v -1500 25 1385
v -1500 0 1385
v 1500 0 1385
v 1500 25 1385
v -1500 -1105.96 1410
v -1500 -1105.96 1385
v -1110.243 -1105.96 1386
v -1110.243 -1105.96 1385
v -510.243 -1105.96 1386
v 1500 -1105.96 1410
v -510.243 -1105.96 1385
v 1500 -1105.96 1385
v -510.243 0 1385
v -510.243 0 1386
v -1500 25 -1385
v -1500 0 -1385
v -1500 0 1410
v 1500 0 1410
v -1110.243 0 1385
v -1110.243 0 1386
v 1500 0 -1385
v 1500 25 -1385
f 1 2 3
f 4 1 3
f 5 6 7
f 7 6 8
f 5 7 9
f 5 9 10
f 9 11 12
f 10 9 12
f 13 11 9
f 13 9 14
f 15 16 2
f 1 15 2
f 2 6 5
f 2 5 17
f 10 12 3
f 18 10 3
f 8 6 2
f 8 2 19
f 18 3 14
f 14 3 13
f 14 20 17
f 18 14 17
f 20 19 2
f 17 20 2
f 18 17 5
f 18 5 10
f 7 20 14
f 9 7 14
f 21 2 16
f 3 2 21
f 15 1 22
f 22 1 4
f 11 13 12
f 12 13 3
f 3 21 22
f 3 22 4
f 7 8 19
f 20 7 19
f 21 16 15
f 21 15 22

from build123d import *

# Parameters (mm, degrees)
F0_W     = 3000
F0_H     = 2770
F1_DEPTH = 25
F2_W     = 2010.242724
F2_H     = 1105.960011
F2_W_2   = 600
F2_W_3   = 389.757276
F3_DEPTH = 25
F4_DEPTH = 1


with BuildPart() as f1:
    # F0 (on Front) → F1 (new body)
    with BuildSketch(Plane.XZ):
        Rectangle(F0_W, F0_H)
    extrude(amount=-F1_DEPTH)


with BuildPart() as f3:
    # F2 (on face) → F3 (new body)
    with BuildSketch(Plane.XY.offset(1385)):
        with Locations((494.878638, -552.980005)):
            Rectangle(F2_W, F2_H)
        with Locations((-810.242724, -552.980005)):
            Rectangle(F2_W_2, F2_H)
        with Locations((-1305.121362, -552.980005)):
            Rectangle(F2_W_3, F2_H)
    extrude(amount=F3_DEPTH)

    # F2 (on face) → F4 (cut)
    with BuildSketch(Plane.XY.offset(1385)):
        with Locations((-810.242724, -552.980005)):
            Rectangle(F2_W_2, F2_H)
    extrude(amount=F4_DEPTH, mode=Mode.SUBTRACT)


solid = Compound([f1.part, f3.part])
